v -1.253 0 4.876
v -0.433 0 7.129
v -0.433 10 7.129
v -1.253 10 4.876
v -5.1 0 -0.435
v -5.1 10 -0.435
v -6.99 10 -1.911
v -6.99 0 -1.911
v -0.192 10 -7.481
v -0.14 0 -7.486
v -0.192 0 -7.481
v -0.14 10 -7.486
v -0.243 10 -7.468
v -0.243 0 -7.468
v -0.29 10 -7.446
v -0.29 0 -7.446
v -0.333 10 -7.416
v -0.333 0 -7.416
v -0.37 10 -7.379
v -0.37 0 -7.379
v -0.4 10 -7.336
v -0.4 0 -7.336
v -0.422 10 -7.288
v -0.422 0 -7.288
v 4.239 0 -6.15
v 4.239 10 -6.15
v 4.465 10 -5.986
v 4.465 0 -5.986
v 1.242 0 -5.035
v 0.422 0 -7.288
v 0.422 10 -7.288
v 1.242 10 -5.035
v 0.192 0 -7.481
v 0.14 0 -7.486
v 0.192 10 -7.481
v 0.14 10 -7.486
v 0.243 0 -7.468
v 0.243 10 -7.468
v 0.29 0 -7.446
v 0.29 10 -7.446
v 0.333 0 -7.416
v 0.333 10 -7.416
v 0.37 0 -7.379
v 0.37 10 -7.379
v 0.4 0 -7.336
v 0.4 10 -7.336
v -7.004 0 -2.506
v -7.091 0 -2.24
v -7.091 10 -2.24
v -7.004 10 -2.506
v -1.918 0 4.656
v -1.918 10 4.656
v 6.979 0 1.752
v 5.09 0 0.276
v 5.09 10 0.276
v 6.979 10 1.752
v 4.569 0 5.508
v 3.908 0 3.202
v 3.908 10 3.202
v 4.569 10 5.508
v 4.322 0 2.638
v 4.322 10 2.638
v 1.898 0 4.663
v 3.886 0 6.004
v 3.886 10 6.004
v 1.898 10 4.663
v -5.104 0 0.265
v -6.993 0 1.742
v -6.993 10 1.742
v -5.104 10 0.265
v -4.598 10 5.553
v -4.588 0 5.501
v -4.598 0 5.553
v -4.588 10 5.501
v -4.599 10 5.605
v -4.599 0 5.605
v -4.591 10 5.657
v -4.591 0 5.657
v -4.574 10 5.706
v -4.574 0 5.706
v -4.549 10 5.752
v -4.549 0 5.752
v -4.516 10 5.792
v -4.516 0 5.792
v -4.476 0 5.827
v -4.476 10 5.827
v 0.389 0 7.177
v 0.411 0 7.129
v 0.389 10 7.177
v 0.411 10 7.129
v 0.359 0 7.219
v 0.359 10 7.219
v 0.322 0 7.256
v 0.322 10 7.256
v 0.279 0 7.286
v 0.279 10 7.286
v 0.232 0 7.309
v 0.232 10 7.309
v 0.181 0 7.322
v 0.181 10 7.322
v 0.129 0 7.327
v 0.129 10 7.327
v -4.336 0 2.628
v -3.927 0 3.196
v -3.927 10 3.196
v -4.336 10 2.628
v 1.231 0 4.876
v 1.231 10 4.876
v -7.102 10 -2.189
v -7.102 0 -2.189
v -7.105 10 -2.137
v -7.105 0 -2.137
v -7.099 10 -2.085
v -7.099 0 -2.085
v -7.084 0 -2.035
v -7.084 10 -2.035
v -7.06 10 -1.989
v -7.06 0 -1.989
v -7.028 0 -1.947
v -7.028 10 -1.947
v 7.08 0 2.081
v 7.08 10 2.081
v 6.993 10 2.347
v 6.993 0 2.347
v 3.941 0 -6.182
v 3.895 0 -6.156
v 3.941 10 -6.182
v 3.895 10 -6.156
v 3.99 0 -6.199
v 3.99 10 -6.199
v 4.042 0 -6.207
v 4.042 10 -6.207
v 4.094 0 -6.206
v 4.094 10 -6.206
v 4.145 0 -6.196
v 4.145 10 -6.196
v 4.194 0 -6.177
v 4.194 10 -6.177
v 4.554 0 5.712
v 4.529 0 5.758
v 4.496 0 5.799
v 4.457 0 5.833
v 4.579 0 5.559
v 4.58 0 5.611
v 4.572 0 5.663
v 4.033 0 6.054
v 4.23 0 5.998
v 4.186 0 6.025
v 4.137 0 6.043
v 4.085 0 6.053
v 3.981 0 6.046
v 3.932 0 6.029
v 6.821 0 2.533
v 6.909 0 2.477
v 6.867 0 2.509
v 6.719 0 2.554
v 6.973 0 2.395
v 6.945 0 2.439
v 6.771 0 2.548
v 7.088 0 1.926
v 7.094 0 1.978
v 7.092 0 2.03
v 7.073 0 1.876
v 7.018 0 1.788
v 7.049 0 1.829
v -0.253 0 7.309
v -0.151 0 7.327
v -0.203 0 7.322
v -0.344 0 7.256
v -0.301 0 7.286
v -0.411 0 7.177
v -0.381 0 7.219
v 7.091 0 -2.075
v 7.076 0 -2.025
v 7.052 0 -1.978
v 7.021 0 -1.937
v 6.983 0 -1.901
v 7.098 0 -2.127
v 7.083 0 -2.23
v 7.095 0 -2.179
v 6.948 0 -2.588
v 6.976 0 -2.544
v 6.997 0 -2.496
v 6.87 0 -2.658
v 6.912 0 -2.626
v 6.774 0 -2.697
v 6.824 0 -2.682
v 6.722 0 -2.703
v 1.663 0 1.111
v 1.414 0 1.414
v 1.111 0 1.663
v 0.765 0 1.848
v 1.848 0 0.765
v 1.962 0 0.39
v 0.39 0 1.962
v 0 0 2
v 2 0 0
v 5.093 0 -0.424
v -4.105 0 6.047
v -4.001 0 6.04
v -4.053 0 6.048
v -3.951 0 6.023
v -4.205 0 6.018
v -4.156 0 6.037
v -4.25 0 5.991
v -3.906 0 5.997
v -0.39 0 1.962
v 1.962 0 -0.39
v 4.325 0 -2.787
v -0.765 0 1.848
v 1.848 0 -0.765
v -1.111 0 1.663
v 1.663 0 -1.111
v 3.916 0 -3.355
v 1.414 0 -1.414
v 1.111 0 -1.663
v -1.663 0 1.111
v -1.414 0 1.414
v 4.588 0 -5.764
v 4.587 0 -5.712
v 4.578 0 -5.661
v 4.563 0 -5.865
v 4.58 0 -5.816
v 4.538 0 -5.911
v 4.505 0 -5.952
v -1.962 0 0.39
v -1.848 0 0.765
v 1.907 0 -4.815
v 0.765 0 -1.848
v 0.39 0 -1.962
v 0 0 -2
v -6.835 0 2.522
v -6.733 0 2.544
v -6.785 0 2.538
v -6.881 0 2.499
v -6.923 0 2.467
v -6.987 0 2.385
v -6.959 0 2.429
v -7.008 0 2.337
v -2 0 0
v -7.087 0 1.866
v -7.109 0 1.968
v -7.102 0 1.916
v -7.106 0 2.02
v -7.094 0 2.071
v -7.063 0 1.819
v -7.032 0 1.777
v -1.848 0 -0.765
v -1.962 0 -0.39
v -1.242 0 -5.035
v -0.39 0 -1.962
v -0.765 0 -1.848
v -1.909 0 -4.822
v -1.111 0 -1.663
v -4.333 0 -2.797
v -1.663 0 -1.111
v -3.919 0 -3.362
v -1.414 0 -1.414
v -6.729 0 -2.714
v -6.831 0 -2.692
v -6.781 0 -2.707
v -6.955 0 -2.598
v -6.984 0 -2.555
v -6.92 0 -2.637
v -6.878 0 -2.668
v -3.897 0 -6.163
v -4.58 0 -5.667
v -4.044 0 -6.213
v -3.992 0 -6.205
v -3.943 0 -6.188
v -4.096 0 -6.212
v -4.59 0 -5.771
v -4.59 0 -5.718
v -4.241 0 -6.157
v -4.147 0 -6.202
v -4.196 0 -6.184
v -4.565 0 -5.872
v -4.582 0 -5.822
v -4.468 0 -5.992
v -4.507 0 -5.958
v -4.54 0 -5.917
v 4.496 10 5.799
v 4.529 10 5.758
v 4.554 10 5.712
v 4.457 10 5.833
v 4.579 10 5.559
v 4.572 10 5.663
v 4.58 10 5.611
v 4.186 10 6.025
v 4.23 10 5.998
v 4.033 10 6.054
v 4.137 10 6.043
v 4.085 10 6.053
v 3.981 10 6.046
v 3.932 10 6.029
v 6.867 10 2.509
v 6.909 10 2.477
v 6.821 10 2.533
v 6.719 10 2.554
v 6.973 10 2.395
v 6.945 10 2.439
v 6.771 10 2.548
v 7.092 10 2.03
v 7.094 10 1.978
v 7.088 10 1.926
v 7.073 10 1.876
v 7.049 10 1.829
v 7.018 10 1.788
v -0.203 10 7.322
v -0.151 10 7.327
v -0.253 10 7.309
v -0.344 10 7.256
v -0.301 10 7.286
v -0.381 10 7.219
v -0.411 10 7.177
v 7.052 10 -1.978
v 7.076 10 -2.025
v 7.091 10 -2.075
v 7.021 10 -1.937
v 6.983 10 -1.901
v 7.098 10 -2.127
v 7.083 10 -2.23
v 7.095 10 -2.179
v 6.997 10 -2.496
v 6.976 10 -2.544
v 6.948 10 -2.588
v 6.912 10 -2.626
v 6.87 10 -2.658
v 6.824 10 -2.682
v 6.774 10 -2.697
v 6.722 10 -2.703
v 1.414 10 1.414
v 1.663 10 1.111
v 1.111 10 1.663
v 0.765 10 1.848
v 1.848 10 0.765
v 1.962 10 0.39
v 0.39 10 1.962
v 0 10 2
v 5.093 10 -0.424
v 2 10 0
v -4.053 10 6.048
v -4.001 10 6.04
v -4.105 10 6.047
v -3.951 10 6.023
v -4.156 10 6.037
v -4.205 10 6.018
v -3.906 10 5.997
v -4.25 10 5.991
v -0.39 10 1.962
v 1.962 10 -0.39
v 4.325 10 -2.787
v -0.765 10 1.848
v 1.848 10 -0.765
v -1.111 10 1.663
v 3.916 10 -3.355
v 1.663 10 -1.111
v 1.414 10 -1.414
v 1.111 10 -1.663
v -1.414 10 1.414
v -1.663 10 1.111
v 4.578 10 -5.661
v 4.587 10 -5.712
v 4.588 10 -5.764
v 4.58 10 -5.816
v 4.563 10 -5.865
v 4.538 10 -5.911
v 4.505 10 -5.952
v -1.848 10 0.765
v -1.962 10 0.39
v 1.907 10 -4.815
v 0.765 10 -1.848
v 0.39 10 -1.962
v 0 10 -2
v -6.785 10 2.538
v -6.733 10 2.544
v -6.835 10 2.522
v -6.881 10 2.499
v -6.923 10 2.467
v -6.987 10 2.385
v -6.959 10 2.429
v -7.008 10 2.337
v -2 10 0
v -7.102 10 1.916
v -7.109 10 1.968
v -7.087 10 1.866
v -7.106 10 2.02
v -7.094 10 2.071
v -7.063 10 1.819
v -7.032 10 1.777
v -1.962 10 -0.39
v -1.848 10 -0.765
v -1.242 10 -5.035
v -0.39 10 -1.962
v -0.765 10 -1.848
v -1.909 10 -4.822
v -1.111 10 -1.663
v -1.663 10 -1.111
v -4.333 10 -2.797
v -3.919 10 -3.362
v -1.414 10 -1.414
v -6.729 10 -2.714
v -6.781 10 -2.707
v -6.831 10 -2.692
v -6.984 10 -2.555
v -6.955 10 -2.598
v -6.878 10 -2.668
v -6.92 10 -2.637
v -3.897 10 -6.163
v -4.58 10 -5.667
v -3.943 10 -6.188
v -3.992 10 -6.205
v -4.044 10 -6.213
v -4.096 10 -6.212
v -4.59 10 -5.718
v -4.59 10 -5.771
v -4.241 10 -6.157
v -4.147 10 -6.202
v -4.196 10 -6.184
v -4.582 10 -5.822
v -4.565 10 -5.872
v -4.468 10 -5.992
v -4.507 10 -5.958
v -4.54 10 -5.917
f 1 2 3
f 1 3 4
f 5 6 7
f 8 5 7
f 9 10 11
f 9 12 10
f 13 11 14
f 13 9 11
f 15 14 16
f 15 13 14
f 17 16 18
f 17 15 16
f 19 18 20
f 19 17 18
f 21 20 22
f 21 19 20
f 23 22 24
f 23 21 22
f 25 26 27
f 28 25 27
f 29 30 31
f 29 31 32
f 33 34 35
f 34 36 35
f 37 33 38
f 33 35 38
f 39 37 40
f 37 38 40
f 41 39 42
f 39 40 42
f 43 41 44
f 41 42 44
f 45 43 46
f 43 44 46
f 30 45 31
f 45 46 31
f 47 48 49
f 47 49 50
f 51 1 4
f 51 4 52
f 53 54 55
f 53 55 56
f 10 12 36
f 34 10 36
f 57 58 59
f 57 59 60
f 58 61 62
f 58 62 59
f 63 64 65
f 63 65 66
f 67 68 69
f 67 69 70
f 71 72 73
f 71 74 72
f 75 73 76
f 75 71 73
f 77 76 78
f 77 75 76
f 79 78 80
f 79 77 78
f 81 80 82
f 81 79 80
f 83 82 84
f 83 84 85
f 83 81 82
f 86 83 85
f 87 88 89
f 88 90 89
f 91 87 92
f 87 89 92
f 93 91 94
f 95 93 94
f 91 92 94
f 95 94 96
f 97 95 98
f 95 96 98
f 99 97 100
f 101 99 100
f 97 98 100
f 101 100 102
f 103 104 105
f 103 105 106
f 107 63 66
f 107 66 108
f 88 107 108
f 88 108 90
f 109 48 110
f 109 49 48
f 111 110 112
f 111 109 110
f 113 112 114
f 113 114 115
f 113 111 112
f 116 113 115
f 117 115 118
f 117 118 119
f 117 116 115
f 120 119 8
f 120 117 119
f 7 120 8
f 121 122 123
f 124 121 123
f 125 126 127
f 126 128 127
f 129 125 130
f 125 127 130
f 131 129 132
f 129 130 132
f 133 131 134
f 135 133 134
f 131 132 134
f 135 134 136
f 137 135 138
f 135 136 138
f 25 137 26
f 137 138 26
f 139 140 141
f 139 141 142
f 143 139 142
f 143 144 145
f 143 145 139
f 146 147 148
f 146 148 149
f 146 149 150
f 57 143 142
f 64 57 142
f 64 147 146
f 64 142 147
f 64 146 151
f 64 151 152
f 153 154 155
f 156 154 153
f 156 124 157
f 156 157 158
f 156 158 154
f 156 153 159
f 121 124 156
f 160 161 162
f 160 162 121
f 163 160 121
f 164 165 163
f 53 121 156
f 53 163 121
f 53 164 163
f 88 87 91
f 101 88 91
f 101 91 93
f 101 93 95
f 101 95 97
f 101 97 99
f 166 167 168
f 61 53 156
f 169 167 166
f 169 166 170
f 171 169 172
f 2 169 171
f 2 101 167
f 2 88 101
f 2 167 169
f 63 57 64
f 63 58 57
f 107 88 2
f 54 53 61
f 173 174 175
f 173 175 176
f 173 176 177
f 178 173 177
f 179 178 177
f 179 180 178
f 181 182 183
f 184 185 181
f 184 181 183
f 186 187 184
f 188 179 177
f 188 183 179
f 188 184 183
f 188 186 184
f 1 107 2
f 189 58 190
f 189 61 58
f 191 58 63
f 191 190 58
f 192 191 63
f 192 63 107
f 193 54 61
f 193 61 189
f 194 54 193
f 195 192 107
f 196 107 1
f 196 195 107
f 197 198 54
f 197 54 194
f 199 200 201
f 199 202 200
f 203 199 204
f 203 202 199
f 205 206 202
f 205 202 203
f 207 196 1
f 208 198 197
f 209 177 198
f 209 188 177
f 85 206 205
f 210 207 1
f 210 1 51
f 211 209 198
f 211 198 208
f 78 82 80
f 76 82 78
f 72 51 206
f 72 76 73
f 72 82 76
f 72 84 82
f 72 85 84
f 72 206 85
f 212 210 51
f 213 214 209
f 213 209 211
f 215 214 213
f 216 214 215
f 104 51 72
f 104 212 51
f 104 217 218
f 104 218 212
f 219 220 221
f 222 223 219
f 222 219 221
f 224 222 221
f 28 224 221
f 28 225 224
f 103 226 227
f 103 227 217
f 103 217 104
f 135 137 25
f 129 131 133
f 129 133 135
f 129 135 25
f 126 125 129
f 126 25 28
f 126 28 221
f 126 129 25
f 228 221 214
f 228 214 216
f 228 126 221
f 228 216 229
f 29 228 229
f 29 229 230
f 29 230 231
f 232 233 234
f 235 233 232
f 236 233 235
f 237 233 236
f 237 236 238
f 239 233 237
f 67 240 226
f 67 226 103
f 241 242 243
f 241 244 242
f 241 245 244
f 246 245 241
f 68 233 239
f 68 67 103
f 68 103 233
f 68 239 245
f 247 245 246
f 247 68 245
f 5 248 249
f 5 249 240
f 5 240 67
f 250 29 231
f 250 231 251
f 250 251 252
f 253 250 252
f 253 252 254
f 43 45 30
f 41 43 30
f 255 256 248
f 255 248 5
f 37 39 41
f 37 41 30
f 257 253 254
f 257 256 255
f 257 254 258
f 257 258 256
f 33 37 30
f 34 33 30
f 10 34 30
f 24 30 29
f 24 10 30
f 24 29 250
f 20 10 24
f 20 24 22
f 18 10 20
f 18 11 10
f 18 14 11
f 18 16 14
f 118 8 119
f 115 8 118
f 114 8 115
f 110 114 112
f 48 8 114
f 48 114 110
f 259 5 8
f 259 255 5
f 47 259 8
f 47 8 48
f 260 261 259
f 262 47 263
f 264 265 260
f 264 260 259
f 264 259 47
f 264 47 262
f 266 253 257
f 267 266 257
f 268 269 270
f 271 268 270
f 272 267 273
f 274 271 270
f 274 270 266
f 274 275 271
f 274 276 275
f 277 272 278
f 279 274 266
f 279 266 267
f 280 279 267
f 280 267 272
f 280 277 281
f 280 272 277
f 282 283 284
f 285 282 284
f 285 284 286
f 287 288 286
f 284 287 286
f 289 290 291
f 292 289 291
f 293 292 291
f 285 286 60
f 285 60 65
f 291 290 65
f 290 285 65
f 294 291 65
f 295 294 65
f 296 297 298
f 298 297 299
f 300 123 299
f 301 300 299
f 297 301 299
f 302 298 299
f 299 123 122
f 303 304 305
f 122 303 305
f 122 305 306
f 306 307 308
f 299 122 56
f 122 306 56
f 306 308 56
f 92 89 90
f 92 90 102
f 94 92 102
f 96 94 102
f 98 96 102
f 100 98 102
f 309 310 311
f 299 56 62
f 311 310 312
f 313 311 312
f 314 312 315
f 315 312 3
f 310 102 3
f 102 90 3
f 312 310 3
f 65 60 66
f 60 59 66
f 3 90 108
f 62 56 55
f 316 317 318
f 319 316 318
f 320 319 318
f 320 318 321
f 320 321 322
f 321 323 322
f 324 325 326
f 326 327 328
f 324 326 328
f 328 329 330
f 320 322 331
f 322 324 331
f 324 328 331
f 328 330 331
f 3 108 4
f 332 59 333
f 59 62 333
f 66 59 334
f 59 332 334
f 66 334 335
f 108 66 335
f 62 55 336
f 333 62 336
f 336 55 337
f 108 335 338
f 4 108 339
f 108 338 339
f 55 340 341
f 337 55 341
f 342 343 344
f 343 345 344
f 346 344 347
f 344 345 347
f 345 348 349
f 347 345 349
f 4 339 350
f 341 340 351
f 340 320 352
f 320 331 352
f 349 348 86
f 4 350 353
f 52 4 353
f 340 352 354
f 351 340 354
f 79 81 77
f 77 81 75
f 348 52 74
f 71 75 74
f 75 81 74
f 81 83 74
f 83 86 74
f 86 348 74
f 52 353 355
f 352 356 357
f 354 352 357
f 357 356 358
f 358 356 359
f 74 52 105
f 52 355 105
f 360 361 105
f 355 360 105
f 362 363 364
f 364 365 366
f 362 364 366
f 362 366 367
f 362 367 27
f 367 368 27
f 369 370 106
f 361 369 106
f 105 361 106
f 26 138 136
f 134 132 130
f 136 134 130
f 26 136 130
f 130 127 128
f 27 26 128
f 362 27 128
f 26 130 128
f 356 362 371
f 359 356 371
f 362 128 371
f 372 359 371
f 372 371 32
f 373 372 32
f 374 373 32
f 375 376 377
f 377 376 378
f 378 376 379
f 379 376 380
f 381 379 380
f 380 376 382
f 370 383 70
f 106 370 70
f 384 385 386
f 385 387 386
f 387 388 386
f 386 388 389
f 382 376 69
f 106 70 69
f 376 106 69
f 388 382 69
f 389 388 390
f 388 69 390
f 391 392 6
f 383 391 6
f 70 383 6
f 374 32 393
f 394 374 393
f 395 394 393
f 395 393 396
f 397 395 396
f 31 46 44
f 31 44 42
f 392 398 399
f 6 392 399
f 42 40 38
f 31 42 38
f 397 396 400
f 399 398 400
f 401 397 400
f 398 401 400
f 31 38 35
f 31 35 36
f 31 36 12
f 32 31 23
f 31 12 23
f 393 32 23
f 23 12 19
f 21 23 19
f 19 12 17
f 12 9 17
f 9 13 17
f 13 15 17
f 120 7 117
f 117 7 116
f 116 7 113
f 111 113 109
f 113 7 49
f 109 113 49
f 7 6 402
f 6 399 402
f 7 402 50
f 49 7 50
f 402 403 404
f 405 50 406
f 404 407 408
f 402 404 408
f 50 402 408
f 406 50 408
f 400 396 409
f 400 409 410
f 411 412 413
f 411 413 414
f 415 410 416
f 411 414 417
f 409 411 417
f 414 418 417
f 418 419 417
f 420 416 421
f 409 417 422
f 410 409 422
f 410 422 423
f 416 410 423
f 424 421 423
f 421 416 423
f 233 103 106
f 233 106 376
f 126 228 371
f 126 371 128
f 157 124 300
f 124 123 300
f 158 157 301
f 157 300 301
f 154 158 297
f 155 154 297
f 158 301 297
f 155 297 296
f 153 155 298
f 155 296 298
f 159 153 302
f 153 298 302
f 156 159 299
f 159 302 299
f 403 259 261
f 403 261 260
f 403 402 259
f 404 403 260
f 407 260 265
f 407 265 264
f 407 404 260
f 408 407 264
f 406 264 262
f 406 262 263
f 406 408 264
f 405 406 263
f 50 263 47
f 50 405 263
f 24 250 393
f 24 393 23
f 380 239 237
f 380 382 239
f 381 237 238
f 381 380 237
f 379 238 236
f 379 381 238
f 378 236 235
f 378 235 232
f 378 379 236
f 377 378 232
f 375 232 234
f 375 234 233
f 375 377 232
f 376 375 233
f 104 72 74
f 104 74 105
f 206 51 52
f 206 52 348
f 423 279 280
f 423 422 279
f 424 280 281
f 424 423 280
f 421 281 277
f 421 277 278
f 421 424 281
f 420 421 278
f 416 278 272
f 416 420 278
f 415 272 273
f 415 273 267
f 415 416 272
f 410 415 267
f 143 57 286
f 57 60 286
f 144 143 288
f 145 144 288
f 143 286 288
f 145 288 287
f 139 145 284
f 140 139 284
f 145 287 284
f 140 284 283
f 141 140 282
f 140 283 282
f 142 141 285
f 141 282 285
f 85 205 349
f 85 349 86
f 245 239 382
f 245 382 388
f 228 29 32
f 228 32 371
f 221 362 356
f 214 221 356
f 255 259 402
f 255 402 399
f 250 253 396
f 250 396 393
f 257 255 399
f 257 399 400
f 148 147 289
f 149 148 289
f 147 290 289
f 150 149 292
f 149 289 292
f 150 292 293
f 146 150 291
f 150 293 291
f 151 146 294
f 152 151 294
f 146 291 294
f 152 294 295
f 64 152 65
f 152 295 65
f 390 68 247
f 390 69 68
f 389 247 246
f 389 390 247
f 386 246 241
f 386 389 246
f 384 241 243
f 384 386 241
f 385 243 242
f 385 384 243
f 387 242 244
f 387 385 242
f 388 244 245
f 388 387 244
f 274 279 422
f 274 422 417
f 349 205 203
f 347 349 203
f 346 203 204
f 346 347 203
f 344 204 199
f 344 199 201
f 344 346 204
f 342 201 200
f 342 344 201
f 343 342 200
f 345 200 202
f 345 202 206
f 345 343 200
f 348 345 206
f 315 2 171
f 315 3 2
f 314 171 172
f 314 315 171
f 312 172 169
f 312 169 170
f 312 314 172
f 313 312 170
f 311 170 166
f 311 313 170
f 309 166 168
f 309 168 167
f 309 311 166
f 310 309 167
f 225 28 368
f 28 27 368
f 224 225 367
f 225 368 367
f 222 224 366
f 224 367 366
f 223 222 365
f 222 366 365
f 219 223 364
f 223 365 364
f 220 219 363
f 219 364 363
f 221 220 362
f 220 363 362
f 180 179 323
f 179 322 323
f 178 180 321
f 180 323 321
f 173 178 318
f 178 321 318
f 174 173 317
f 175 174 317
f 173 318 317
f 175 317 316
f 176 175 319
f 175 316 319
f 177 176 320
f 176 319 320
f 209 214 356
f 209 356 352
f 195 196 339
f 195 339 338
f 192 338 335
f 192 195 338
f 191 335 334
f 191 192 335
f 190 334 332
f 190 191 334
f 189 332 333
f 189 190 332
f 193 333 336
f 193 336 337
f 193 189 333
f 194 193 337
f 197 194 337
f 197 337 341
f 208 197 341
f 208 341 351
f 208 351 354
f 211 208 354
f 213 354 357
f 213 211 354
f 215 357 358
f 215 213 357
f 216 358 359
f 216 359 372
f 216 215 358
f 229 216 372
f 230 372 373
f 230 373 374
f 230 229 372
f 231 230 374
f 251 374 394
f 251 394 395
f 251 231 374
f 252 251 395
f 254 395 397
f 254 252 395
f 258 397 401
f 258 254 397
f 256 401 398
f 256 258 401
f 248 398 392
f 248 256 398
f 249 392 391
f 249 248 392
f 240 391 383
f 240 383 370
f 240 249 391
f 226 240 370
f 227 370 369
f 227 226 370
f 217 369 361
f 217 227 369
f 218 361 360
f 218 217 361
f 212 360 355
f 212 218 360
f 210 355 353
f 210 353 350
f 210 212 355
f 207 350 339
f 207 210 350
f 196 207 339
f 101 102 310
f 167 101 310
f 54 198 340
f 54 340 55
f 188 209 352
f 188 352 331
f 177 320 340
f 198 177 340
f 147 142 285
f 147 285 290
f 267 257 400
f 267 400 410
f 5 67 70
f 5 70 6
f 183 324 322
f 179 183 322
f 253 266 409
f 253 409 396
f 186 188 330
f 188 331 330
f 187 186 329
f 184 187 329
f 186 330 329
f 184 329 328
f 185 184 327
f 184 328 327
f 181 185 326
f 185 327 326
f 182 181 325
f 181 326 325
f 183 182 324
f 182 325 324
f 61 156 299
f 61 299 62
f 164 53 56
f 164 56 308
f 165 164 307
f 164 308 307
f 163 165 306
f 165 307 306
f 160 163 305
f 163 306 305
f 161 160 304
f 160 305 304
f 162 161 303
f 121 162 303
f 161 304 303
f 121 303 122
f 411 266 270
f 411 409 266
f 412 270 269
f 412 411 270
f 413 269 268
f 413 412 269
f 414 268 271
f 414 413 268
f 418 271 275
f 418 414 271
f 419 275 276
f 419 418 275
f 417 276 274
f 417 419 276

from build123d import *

# Parameters (mm, degrees)
SKETCH2_R           = 2
BOSS_EXTRUDE1_DEPTH = 10
FILLET1_R           = 0.3


with BuildPart() as part:
    # Sketch2 → Boss-Extrude1 (new body)
    with BuildSketch(Plane(origin=(0, 0, 0), x_dir=(1, 0, 0), z_dir=(0, 1, 0))):
        Polygon((-0.35, 7.485859039), (0.35, 7.485859039), (1.242069669, 5.034917766), (1.906773221, 4.815442965), (4.069099878, 6.273950712), (4.635411774, 5.862501035), (3.916484162, 3.355302497), (4.325236581, 2.787040708), (6.931884937, 2.696014542), (7.148196833, 2.03027498), (5.092877853, 0.424483803), (5.089549606, -0.275508285), (7.144868587, -1.881299462), (6.928556691, -2.547039024), (4.321908334, -2.63806519), (3.907770701, -3.202414391), (4.626698313, -5.709612929), (4.060386417, -6.121062606), (1.898059759, -4.662554859), (1.231299238, -4.87569896), (0.339229569, -7.326640233), (-0.360770431, -7.326640233), (-1.2528401, -4.87569896), (-1.917543652, -4.656224159), (-4.079870309, -6.114731905), (-4.646182205, -5.703282228), (-3.927254593, -3.196083691), (-4.336007012, -2.627821902), (-6.942655368, -2.536795735), (-7.158967264, -1.871056174), (-5.103648284, -0.265264996), (-5.100320037, 0.434727091), (-7.155639018, 2.040518269), (-6.939327122, 2.70625783), (-4.332678765, 2.797283997), (-3.918541132, 3.361633198), (-4.637468744, 5.868831735), (-4.071156848, 6.280281412), (-1.90883019, 4.821773666), (-1.242069669, 5.034917766), align=None)
        with Locations(Location((0, 0, 0), (0, 0, 270))):
            Circle(SKETCH2_R, mode=Mode.SUBTRACT)
    extrude(amount=BOSS_EXTRUDE1_DEPTH)

    # Fillet1
    fillet1_edges = [part.edges().sort_by_distance(p)[0] for p in [
        (-0.35, 5, -7.485859039),
        (0.35, 5, -7.485859039),
        (4.069099878, 5, -6.273950712),
        (4.635411774, 5, -5.862501035),
        (6.931884937, 5, -2.696014542),
        (7.148196833, 5, -2.03027498),
        (7.144868587, 5, 1.881299462),
        (6.928556691, 5, 2.547039024),
        (4.626698313, 5, 5.709612929),
        (4.060386417, 5, 6.121062606),
        (0.339229569, 5, 7.326640233),
        (-0.360770431, 5, 7.326640233),
        (-4.079870309, 5, 6.114731905),
        (-4.646182205, 5, 5.703282228),
        (-6.942655368, 5, 2.536795735),
        (-7.158967264, 5, 1.871056174),
        (-7.155639018, 5, -2.040518269),
        (-6.939327122, 5, -2.70625783),
        (-4.637468744, 5, -5.868831735),
        (-4.071156848, 5, -6.280281412),
    ]]
    fillet(fillet1_edges, radius=FILLET1_R)


solid = part.part
